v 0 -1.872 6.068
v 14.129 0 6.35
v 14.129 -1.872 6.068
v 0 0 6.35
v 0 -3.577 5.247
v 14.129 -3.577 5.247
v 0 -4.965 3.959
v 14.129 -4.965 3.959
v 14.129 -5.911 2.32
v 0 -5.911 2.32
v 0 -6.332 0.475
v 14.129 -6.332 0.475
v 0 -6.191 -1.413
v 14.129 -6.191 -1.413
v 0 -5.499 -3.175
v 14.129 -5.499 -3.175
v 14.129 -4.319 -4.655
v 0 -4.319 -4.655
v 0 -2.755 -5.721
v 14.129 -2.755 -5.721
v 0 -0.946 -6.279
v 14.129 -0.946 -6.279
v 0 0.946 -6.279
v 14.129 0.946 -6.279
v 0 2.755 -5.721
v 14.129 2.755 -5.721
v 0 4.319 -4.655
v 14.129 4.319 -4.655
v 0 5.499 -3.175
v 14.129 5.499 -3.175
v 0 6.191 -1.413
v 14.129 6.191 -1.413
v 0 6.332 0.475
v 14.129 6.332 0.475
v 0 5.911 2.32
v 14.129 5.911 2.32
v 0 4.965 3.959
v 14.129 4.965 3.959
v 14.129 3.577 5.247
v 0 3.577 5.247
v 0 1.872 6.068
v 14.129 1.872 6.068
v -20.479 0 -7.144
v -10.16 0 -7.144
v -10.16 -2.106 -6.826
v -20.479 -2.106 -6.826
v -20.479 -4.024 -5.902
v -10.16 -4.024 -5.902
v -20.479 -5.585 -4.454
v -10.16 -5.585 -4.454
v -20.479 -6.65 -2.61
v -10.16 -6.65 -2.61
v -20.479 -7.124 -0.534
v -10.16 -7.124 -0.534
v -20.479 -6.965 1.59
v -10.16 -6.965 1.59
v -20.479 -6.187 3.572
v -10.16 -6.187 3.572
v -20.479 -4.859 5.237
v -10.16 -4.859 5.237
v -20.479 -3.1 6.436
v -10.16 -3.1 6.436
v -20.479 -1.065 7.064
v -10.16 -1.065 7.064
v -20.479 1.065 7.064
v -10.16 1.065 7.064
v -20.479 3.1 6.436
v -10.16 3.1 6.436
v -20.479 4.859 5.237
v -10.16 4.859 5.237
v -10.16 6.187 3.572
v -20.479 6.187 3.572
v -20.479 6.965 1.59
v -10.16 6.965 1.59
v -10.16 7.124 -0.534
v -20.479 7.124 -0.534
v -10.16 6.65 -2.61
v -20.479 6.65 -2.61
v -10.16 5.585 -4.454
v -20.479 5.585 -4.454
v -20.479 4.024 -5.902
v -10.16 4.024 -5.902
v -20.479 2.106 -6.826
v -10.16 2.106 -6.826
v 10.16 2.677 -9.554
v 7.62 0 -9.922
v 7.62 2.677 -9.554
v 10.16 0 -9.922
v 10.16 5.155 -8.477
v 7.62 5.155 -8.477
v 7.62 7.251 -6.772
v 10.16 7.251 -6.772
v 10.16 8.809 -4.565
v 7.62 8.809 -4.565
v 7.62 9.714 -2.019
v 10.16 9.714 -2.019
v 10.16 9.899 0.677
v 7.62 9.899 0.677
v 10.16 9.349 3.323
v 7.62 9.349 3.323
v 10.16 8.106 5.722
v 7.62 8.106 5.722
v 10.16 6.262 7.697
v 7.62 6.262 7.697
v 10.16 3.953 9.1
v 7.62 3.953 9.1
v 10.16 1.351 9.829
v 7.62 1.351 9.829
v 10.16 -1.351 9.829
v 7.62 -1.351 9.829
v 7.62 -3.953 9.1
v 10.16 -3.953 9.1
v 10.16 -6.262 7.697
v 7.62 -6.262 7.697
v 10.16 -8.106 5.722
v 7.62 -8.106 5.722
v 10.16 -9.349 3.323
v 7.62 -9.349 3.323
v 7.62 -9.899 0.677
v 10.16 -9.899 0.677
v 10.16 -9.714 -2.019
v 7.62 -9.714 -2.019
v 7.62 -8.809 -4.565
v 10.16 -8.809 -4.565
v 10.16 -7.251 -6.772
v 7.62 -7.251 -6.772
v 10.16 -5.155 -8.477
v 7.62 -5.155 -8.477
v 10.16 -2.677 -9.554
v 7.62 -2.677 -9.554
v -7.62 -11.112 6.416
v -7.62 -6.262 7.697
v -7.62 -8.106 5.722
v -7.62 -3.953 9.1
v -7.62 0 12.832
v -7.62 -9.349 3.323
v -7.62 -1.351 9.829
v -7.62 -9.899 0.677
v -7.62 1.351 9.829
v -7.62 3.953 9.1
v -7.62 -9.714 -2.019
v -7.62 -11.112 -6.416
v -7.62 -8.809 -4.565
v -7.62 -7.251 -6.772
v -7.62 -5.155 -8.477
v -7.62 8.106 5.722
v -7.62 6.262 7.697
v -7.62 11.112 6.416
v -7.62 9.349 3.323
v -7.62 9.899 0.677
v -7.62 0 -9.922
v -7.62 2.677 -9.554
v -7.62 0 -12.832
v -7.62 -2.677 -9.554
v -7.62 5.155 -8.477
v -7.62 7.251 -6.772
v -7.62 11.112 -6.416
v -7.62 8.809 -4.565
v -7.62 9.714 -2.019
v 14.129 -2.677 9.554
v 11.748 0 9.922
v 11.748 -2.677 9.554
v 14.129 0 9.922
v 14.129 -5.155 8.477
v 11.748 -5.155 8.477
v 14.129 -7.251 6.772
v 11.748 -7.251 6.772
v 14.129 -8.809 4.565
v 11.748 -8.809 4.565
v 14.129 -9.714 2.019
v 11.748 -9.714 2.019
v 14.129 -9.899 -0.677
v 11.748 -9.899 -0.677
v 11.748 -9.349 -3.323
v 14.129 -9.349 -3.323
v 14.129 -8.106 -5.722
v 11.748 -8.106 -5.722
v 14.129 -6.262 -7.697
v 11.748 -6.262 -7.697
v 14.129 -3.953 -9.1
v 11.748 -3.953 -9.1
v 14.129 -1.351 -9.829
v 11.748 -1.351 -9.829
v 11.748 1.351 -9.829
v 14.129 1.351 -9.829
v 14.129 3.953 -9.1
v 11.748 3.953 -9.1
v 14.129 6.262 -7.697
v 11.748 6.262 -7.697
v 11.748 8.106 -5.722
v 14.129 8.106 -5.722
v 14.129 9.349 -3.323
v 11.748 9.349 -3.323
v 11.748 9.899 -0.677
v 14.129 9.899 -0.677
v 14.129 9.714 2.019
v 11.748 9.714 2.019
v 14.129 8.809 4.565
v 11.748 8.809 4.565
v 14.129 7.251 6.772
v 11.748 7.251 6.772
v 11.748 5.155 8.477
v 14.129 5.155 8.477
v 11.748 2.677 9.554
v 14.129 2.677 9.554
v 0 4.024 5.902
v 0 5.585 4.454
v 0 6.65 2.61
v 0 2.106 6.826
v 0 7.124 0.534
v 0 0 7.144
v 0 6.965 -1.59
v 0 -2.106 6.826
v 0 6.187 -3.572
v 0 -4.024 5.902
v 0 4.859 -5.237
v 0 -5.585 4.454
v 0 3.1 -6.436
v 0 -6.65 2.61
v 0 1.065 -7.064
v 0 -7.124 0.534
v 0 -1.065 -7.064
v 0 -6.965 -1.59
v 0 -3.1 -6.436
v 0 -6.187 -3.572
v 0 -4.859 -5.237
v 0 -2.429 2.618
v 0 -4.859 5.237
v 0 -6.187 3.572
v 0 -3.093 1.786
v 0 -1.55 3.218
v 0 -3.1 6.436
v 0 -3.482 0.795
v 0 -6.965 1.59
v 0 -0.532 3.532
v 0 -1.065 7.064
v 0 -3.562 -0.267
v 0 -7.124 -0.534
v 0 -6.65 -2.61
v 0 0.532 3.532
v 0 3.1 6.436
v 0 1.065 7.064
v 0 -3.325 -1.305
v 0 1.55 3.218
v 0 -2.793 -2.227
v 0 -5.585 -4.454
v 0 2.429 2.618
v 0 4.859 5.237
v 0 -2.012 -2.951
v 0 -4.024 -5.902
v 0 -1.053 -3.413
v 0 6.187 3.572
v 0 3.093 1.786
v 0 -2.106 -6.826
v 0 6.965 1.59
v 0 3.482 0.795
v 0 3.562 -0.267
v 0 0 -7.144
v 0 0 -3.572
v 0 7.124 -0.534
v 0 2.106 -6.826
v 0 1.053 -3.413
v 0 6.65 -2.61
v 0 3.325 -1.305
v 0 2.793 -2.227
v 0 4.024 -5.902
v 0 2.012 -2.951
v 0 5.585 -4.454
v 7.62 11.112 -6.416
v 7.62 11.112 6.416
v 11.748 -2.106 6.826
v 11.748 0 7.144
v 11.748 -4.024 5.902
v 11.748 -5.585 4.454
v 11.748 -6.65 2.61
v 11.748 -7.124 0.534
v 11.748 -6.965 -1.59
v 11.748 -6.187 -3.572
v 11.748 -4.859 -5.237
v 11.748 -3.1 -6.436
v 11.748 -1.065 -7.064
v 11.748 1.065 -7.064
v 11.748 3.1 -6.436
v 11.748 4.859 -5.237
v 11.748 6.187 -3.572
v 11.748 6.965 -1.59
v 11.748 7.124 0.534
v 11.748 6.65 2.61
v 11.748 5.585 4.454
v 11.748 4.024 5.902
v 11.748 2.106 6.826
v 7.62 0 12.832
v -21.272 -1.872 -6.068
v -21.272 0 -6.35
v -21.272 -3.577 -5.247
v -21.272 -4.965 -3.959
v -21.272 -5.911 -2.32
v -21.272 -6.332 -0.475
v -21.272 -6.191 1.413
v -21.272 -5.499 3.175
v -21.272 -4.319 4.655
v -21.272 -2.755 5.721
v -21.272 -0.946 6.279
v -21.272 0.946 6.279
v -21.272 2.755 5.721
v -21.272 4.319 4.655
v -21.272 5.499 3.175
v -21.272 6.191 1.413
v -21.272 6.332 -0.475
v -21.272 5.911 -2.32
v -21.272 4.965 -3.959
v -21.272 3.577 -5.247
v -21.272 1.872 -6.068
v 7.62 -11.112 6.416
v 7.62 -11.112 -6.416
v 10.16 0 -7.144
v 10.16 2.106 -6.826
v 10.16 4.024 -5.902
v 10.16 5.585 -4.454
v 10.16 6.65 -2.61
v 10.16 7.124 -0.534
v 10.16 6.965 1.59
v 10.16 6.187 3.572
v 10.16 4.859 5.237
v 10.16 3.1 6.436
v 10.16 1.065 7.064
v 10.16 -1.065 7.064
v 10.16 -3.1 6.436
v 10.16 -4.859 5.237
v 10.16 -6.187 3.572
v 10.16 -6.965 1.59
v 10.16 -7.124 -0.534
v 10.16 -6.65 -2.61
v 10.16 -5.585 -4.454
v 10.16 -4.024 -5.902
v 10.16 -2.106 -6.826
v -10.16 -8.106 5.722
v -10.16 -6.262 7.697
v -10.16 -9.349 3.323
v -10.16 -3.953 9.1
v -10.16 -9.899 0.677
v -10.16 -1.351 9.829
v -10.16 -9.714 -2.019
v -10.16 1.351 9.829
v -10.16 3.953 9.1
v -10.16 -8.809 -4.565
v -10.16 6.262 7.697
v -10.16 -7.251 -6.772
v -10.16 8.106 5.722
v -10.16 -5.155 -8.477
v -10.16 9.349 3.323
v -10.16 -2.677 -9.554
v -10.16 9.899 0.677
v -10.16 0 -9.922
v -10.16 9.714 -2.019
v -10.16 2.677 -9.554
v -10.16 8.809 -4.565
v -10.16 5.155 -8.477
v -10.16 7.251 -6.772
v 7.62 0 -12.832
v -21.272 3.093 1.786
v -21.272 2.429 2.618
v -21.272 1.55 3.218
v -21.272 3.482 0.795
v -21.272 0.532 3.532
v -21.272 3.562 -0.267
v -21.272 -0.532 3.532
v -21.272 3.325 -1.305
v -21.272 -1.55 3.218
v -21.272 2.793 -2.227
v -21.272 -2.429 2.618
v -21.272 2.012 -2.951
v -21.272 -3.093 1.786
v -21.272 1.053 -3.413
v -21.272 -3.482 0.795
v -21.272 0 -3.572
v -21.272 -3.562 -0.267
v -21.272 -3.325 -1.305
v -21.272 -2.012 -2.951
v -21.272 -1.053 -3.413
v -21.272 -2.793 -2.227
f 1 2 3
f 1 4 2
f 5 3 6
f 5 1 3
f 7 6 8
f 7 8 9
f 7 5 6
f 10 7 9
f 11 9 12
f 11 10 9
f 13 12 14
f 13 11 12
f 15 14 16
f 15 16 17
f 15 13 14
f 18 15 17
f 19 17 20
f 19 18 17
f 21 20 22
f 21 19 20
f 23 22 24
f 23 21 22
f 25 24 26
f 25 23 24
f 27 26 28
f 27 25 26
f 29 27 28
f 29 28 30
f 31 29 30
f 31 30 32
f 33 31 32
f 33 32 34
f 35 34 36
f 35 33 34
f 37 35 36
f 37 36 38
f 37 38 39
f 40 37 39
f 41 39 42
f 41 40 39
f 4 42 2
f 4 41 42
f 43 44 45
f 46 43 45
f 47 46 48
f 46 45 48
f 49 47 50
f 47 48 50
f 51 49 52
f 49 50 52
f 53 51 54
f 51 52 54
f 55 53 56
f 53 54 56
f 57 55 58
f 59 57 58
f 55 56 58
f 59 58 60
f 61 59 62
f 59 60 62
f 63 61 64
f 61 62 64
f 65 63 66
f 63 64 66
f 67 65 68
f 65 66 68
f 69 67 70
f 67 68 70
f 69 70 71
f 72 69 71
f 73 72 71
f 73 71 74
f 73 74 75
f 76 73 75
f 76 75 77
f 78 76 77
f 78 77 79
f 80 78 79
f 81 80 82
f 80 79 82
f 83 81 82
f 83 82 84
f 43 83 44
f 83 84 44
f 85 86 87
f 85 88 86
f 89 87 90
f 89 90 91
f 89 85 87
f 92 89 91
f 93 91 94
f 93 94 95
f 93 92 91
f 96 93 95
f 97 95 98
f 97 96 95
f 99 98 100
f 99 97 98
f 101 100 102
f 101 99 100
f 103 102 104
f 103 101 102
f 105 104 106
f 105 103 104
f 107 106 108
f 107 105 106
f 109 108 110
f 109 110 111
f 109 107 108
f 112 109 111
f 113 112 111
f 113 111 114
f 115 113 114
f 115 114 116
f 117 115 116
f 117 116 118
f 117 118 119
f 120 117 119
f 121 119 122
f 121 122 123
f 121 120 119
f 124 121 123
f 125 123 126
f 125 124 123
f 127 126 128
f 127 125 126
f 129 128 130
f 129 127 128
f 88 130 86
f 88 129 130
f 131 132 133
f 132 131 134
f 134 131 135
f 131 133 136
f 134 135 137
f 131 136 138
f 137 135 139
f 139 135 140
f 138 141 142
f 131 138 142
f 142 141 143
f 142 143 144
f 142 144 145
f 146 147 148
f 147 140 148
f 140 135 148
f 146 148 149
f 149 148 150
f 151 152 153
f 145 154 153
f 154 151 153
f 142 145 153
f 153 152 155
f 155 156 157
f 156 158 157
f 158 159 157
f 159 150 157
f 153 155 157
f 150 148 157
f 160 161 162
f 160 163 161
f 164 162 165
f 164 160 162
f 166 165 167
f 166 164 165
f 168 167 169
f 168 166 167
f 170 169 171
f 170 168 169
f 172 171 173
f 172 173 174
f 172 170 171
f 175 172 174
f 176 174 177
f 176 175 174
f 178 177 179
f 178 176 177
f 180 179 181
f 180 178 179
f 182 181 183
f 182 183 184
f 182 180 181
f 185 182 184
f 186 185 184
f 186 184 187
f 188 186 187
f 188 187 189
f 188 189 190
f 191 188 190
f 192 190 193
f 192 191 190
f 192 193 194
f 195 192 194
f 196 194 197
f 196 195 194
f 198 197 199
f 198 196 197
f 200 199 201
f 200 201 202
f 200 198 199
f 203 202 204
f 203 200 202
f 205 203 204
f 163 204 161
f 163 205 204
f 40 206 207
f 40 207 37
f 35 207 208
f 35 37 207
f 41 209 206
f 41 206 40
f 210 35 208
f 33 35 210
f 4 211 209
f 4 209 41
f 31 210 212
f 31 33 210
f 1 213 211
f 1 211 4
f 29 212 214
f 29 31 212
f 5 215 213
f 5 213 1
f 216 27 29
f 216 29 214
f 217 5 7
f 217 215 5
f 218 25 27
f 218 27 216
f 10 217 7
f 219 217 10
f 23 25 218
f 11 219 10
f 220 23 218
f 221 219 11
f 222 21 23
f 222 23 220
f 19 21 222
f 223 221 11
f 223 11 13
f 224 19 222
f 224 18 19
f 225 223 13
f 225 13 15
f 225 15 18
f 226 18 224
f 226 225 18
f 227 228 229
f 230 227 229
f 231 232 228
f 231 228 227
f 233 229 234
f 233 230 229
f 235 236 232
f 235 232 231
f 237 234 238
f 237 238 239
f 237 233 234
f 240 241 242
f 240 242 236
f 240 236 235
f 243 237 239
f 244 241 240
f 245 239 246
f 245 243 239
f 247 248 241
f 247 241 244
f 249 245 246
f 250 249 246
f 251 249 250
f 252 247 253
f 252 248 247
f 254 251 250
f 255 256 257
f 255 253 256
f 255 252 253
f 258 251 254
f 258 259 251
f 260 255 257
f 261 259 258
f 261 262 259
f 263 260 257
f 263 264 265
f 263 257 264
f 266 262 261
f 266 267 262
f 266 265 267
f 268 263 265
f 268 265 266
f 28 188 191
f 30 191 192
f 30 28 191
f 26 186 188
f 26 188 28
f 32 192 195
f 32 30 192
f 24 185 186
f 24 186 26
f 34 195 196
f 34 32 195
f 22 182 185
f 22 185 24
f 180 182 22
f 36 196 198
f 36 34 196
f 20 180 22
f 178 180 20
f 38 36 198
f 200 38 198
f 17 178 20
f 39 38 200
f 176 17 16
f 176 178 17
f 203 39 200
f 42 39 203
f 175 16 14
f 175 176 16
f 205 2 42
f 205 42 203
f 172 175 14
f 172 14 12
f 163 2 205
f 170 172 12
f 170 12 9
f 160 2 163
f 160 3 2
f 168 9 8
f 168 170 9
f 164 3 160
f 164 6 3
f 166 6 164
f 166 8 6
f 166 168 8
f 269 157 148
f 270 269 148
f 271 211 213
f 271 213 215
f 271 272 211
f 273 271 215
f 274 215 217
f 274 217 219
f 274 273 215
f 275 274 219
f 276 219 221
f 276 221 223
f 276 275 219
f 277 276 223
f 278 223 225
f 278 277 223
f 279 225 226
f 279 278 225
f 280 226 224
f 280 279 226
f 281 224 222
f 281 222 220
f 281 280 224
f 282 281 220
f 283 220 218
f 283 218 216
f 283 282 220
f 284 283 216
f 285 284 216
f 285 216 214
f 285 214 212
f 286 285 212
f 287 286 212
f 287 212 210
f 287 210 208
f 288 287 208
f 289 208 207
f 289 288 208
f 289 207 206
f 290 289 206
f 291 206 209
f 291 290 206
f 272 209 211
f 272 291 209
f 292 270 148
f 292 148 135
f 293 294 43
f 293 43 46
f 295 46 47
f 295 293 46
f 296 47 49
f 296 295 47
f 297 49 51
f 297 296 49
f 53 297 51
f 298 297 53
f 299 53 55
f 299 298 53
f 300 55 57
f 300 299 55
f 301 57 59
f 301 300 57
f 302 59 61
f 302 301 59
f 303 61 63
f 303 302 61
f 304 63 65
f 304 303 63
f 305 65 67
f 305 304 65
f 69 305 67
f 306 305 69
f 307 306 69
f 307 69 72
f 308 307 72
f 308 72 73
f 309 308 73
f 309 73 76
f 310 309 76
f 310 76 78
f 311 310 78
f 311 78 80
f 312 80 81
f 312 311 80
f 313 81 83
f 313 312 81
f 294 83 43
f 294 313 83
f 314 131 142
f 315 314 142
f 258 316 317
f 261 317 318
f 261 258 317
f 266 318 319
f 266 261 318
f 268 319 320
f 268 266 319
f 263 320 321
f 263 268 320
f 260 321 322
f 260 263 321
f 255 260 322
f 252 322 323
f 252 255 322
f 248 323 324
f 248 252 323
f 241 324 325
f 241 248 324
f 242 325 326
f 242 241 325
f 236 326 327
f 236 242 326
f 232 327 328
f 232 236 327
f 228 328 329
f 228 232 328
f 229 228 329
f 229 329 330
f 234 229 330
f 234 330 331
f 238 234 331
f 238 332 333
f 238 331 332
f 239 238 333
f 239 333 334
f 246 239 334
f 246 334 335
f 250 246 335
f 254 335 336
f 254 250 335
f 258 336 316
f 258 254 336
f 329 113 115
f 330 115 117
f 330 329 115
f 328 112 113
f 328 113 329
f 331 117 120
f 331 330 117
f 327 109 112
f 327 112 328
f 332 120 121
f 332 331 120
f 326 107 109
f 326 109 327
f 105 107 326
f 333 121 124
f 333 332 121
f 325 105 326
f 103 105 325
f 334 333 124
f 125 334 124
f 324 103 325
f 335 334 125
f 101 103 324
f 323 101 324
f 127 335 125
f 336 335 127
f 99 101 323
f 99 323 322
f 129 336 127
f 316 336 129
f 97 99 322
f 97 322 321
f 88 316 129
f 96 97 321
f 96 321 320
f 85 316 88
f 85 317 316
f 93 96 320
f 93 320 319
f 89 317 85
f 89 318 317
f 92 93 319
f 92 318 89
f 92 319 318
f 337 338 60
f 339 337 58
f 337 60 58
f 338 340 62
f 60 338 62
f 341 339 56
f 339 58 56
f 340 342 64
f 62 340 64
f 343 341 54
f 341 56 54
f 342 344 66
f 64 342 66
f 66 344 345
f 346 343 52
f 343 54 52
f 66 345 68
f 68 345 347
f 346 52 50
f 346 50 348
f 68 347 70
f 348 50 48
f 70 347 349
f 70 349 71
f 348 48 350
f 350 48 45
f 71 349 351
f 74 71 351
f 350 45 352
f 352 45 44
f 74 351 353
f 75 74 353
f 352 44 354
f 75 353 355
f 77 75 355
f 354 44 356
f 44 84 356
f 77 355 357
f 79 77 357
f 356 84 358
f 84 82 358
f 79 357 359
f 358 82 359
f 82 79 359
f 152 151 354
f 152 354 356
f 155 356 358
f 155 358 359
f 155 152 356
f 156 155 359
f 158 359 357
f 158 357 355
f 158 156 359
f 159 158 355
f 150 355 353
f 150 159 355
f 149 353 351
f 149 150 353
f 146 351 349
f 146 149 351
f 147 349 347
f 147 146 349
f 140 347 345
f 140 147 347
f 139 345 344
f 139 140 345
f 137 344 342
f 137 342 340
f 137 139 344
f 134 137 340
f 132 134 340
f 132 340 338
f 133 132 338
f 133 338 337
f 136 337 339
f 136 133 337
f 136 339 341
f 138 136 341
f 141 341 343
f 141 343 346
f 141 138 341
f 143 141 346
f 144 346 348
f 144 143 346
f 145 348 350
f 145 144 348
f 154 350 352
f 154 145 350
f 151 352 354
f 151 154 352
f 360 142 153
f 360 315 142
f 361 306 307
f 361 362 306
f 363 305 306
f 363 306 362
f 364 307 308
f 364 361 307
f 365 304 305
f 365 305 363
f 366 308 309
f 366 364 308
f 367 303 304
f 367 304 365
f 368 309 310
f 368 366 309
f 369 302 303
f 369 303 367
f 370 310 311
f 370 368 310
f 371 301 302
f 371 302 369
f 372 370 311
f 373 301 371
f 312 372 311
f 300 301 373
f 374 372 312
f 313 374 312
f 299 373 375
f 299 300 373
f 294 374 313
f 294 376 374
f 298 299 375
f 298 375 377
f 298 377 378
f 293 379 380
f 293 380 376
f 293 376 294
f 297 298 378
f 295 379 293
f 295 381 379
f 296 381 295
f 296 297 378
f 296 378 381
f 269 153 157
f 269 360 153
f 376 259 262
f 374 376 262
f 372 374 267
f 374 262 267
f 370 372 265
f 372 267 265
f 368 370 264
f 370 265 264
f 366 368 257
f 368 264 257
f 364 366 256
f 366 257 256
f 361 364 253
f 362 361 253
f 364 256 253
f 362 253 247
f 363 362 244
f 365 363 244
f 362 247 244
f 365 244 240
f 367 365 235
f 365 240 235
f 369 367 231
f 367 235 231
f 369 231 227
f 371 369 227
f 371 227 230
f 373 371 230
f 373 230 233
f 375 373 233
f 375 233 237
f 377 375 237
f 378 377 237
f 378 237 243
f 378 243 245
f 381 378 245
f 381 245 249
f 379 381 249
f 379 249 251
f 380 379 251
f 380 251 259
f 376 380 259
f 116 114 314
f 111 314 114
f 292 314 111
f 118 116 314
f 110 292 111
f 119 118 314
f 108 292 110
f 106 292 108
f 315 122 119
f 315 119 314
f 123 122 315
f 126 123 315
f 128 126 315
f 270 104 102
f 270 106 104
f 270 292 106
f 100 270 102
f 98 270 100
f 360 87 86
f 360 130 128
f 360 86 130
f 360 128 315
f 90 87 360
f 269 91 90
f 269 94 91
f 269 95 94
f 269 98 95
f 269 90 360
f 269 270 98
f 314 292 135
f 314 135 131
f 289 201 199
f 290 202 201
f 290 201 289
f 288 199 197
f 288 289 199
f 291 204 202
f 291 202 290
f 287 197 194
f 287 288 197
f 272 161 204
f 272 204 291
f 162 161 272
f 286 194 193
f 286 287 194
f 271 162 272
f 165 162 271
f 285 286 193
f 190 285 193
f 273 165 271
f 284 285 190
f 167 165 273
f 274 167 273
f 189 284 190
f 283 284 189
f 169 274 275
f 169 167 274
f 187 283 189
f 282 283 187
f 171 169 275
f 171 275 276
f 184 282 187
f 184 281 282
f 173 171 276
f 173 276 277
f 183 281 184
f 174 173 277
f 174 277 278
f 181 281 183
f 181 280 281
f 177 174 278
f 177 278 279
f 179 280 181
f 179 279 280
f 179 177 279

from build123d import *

# Parameters (mm, degrees)
SKETCH2_R          = 9.921875
EXTRUDE1_DEPTH     = 10.16
EXTRUDE2_DEPTH     = 7.62
SKETCH4_R          = 7.14375
EXTRUDE3_DEPTH     = 11.1125
CHAMFER1_SIZE      = 0.79375
SKETCH5_R          = 3.571875
CUT_EXTRUDE1_DEPTH = 28.215016458
CUT_EXTRUDE2_REACH = 29.215
SKETCH6_R          = 7.14375


with BuildPart() as part:
    # Sketch2 → Extrude1 (new, symmetric)
    with BuildSketch(Plane(origin=(0, 0, 0), x_dir=(0, 0, -1), z_dir=(1, 0, 0))):
        Circle(SKETCH2_R)
    extrude(amount=EXTRUDE1_DEPTH, both=True)

    # Sketch3 → Extrude2 (add, symmetric)
    with BuildSketch(Plane(origin=(0, 0, 0), x_dir=(0, 0, -1), z_dir=(1, 0, 0))):
        Polygon((12.831609733, 0), (6.415804866, 11.1125), (-6.415804866, 11.1125), (-12.831609733, 0), (-6.415804866, -11.1125), (6.415804866, -11.1125), align=None)
    extrude(amount=EXTRUDE2_DEPTH, both=True)

    # Sketch4 → Extrude3 (add)
    with BuildSketch(Plane.ZY.offset(10.16)):
        Circle(SKETCH4_R)
    extrude(amount=EXTRUDE3_DEPTH)

    # Chamfer1
    chamfer1_edges = [part.edges().sort_by_distance(p)[0] for p in [
        (-21.2725, 0, -7.14375),
    ]]
    chamfer(chamfer1_edges, length=CHAMFER1_SIZE)

    # Sketch5 → Cut-Extrude1 (cut, through all)
    with BuildSketch(Plane(origin=(0, 0, 0), x_dir=(0, 0, -1), z_dir=(1, 0, 0))):
        Circle(SKETCH5_R)
    extrude(amount=-CUT_EXTRUDE1_DEPTH, mode=Mode.SUBTRACT)

    # Sketch6 → Cut-Extrude2 (cut, up to next)
    with BuildSketch(Plane(origin=(0, 0, 0), x_dir=(0, 0, -1), z_dir=(1, 0, 0)), mode=Mode.PRIVATE) as cut_extrude2_sk1:
        Circle(SKETCH6_R)
    cut_extrude2_tool1 = extrude(cut_extrude2_sk1.sketch, amount=CUT_EXTRUDE2_REACH, mode=Mode.PRIVATE) & part.part
    add(cut_extrude2_tool1.solids().sort_by_distance((0, 0, 0))[0], mode=Mode.SUBTRACT)


with BuildPart() as body_2:
    # Sketch7 → Revolve1 (revolve)
    with BuildSketch(Plane.XY):
        Polygon((0, 7.14375), (11.7475, 7.14375), (11.7475, 9.921875), (14.12875, 9.921875), (14.12875, 6.35), (0, 6.35), align=None)
    revolve(axis=Axis((0, 0, 0), (1, 0, 0)))


solid = Compound([part.part, body_2.part])
